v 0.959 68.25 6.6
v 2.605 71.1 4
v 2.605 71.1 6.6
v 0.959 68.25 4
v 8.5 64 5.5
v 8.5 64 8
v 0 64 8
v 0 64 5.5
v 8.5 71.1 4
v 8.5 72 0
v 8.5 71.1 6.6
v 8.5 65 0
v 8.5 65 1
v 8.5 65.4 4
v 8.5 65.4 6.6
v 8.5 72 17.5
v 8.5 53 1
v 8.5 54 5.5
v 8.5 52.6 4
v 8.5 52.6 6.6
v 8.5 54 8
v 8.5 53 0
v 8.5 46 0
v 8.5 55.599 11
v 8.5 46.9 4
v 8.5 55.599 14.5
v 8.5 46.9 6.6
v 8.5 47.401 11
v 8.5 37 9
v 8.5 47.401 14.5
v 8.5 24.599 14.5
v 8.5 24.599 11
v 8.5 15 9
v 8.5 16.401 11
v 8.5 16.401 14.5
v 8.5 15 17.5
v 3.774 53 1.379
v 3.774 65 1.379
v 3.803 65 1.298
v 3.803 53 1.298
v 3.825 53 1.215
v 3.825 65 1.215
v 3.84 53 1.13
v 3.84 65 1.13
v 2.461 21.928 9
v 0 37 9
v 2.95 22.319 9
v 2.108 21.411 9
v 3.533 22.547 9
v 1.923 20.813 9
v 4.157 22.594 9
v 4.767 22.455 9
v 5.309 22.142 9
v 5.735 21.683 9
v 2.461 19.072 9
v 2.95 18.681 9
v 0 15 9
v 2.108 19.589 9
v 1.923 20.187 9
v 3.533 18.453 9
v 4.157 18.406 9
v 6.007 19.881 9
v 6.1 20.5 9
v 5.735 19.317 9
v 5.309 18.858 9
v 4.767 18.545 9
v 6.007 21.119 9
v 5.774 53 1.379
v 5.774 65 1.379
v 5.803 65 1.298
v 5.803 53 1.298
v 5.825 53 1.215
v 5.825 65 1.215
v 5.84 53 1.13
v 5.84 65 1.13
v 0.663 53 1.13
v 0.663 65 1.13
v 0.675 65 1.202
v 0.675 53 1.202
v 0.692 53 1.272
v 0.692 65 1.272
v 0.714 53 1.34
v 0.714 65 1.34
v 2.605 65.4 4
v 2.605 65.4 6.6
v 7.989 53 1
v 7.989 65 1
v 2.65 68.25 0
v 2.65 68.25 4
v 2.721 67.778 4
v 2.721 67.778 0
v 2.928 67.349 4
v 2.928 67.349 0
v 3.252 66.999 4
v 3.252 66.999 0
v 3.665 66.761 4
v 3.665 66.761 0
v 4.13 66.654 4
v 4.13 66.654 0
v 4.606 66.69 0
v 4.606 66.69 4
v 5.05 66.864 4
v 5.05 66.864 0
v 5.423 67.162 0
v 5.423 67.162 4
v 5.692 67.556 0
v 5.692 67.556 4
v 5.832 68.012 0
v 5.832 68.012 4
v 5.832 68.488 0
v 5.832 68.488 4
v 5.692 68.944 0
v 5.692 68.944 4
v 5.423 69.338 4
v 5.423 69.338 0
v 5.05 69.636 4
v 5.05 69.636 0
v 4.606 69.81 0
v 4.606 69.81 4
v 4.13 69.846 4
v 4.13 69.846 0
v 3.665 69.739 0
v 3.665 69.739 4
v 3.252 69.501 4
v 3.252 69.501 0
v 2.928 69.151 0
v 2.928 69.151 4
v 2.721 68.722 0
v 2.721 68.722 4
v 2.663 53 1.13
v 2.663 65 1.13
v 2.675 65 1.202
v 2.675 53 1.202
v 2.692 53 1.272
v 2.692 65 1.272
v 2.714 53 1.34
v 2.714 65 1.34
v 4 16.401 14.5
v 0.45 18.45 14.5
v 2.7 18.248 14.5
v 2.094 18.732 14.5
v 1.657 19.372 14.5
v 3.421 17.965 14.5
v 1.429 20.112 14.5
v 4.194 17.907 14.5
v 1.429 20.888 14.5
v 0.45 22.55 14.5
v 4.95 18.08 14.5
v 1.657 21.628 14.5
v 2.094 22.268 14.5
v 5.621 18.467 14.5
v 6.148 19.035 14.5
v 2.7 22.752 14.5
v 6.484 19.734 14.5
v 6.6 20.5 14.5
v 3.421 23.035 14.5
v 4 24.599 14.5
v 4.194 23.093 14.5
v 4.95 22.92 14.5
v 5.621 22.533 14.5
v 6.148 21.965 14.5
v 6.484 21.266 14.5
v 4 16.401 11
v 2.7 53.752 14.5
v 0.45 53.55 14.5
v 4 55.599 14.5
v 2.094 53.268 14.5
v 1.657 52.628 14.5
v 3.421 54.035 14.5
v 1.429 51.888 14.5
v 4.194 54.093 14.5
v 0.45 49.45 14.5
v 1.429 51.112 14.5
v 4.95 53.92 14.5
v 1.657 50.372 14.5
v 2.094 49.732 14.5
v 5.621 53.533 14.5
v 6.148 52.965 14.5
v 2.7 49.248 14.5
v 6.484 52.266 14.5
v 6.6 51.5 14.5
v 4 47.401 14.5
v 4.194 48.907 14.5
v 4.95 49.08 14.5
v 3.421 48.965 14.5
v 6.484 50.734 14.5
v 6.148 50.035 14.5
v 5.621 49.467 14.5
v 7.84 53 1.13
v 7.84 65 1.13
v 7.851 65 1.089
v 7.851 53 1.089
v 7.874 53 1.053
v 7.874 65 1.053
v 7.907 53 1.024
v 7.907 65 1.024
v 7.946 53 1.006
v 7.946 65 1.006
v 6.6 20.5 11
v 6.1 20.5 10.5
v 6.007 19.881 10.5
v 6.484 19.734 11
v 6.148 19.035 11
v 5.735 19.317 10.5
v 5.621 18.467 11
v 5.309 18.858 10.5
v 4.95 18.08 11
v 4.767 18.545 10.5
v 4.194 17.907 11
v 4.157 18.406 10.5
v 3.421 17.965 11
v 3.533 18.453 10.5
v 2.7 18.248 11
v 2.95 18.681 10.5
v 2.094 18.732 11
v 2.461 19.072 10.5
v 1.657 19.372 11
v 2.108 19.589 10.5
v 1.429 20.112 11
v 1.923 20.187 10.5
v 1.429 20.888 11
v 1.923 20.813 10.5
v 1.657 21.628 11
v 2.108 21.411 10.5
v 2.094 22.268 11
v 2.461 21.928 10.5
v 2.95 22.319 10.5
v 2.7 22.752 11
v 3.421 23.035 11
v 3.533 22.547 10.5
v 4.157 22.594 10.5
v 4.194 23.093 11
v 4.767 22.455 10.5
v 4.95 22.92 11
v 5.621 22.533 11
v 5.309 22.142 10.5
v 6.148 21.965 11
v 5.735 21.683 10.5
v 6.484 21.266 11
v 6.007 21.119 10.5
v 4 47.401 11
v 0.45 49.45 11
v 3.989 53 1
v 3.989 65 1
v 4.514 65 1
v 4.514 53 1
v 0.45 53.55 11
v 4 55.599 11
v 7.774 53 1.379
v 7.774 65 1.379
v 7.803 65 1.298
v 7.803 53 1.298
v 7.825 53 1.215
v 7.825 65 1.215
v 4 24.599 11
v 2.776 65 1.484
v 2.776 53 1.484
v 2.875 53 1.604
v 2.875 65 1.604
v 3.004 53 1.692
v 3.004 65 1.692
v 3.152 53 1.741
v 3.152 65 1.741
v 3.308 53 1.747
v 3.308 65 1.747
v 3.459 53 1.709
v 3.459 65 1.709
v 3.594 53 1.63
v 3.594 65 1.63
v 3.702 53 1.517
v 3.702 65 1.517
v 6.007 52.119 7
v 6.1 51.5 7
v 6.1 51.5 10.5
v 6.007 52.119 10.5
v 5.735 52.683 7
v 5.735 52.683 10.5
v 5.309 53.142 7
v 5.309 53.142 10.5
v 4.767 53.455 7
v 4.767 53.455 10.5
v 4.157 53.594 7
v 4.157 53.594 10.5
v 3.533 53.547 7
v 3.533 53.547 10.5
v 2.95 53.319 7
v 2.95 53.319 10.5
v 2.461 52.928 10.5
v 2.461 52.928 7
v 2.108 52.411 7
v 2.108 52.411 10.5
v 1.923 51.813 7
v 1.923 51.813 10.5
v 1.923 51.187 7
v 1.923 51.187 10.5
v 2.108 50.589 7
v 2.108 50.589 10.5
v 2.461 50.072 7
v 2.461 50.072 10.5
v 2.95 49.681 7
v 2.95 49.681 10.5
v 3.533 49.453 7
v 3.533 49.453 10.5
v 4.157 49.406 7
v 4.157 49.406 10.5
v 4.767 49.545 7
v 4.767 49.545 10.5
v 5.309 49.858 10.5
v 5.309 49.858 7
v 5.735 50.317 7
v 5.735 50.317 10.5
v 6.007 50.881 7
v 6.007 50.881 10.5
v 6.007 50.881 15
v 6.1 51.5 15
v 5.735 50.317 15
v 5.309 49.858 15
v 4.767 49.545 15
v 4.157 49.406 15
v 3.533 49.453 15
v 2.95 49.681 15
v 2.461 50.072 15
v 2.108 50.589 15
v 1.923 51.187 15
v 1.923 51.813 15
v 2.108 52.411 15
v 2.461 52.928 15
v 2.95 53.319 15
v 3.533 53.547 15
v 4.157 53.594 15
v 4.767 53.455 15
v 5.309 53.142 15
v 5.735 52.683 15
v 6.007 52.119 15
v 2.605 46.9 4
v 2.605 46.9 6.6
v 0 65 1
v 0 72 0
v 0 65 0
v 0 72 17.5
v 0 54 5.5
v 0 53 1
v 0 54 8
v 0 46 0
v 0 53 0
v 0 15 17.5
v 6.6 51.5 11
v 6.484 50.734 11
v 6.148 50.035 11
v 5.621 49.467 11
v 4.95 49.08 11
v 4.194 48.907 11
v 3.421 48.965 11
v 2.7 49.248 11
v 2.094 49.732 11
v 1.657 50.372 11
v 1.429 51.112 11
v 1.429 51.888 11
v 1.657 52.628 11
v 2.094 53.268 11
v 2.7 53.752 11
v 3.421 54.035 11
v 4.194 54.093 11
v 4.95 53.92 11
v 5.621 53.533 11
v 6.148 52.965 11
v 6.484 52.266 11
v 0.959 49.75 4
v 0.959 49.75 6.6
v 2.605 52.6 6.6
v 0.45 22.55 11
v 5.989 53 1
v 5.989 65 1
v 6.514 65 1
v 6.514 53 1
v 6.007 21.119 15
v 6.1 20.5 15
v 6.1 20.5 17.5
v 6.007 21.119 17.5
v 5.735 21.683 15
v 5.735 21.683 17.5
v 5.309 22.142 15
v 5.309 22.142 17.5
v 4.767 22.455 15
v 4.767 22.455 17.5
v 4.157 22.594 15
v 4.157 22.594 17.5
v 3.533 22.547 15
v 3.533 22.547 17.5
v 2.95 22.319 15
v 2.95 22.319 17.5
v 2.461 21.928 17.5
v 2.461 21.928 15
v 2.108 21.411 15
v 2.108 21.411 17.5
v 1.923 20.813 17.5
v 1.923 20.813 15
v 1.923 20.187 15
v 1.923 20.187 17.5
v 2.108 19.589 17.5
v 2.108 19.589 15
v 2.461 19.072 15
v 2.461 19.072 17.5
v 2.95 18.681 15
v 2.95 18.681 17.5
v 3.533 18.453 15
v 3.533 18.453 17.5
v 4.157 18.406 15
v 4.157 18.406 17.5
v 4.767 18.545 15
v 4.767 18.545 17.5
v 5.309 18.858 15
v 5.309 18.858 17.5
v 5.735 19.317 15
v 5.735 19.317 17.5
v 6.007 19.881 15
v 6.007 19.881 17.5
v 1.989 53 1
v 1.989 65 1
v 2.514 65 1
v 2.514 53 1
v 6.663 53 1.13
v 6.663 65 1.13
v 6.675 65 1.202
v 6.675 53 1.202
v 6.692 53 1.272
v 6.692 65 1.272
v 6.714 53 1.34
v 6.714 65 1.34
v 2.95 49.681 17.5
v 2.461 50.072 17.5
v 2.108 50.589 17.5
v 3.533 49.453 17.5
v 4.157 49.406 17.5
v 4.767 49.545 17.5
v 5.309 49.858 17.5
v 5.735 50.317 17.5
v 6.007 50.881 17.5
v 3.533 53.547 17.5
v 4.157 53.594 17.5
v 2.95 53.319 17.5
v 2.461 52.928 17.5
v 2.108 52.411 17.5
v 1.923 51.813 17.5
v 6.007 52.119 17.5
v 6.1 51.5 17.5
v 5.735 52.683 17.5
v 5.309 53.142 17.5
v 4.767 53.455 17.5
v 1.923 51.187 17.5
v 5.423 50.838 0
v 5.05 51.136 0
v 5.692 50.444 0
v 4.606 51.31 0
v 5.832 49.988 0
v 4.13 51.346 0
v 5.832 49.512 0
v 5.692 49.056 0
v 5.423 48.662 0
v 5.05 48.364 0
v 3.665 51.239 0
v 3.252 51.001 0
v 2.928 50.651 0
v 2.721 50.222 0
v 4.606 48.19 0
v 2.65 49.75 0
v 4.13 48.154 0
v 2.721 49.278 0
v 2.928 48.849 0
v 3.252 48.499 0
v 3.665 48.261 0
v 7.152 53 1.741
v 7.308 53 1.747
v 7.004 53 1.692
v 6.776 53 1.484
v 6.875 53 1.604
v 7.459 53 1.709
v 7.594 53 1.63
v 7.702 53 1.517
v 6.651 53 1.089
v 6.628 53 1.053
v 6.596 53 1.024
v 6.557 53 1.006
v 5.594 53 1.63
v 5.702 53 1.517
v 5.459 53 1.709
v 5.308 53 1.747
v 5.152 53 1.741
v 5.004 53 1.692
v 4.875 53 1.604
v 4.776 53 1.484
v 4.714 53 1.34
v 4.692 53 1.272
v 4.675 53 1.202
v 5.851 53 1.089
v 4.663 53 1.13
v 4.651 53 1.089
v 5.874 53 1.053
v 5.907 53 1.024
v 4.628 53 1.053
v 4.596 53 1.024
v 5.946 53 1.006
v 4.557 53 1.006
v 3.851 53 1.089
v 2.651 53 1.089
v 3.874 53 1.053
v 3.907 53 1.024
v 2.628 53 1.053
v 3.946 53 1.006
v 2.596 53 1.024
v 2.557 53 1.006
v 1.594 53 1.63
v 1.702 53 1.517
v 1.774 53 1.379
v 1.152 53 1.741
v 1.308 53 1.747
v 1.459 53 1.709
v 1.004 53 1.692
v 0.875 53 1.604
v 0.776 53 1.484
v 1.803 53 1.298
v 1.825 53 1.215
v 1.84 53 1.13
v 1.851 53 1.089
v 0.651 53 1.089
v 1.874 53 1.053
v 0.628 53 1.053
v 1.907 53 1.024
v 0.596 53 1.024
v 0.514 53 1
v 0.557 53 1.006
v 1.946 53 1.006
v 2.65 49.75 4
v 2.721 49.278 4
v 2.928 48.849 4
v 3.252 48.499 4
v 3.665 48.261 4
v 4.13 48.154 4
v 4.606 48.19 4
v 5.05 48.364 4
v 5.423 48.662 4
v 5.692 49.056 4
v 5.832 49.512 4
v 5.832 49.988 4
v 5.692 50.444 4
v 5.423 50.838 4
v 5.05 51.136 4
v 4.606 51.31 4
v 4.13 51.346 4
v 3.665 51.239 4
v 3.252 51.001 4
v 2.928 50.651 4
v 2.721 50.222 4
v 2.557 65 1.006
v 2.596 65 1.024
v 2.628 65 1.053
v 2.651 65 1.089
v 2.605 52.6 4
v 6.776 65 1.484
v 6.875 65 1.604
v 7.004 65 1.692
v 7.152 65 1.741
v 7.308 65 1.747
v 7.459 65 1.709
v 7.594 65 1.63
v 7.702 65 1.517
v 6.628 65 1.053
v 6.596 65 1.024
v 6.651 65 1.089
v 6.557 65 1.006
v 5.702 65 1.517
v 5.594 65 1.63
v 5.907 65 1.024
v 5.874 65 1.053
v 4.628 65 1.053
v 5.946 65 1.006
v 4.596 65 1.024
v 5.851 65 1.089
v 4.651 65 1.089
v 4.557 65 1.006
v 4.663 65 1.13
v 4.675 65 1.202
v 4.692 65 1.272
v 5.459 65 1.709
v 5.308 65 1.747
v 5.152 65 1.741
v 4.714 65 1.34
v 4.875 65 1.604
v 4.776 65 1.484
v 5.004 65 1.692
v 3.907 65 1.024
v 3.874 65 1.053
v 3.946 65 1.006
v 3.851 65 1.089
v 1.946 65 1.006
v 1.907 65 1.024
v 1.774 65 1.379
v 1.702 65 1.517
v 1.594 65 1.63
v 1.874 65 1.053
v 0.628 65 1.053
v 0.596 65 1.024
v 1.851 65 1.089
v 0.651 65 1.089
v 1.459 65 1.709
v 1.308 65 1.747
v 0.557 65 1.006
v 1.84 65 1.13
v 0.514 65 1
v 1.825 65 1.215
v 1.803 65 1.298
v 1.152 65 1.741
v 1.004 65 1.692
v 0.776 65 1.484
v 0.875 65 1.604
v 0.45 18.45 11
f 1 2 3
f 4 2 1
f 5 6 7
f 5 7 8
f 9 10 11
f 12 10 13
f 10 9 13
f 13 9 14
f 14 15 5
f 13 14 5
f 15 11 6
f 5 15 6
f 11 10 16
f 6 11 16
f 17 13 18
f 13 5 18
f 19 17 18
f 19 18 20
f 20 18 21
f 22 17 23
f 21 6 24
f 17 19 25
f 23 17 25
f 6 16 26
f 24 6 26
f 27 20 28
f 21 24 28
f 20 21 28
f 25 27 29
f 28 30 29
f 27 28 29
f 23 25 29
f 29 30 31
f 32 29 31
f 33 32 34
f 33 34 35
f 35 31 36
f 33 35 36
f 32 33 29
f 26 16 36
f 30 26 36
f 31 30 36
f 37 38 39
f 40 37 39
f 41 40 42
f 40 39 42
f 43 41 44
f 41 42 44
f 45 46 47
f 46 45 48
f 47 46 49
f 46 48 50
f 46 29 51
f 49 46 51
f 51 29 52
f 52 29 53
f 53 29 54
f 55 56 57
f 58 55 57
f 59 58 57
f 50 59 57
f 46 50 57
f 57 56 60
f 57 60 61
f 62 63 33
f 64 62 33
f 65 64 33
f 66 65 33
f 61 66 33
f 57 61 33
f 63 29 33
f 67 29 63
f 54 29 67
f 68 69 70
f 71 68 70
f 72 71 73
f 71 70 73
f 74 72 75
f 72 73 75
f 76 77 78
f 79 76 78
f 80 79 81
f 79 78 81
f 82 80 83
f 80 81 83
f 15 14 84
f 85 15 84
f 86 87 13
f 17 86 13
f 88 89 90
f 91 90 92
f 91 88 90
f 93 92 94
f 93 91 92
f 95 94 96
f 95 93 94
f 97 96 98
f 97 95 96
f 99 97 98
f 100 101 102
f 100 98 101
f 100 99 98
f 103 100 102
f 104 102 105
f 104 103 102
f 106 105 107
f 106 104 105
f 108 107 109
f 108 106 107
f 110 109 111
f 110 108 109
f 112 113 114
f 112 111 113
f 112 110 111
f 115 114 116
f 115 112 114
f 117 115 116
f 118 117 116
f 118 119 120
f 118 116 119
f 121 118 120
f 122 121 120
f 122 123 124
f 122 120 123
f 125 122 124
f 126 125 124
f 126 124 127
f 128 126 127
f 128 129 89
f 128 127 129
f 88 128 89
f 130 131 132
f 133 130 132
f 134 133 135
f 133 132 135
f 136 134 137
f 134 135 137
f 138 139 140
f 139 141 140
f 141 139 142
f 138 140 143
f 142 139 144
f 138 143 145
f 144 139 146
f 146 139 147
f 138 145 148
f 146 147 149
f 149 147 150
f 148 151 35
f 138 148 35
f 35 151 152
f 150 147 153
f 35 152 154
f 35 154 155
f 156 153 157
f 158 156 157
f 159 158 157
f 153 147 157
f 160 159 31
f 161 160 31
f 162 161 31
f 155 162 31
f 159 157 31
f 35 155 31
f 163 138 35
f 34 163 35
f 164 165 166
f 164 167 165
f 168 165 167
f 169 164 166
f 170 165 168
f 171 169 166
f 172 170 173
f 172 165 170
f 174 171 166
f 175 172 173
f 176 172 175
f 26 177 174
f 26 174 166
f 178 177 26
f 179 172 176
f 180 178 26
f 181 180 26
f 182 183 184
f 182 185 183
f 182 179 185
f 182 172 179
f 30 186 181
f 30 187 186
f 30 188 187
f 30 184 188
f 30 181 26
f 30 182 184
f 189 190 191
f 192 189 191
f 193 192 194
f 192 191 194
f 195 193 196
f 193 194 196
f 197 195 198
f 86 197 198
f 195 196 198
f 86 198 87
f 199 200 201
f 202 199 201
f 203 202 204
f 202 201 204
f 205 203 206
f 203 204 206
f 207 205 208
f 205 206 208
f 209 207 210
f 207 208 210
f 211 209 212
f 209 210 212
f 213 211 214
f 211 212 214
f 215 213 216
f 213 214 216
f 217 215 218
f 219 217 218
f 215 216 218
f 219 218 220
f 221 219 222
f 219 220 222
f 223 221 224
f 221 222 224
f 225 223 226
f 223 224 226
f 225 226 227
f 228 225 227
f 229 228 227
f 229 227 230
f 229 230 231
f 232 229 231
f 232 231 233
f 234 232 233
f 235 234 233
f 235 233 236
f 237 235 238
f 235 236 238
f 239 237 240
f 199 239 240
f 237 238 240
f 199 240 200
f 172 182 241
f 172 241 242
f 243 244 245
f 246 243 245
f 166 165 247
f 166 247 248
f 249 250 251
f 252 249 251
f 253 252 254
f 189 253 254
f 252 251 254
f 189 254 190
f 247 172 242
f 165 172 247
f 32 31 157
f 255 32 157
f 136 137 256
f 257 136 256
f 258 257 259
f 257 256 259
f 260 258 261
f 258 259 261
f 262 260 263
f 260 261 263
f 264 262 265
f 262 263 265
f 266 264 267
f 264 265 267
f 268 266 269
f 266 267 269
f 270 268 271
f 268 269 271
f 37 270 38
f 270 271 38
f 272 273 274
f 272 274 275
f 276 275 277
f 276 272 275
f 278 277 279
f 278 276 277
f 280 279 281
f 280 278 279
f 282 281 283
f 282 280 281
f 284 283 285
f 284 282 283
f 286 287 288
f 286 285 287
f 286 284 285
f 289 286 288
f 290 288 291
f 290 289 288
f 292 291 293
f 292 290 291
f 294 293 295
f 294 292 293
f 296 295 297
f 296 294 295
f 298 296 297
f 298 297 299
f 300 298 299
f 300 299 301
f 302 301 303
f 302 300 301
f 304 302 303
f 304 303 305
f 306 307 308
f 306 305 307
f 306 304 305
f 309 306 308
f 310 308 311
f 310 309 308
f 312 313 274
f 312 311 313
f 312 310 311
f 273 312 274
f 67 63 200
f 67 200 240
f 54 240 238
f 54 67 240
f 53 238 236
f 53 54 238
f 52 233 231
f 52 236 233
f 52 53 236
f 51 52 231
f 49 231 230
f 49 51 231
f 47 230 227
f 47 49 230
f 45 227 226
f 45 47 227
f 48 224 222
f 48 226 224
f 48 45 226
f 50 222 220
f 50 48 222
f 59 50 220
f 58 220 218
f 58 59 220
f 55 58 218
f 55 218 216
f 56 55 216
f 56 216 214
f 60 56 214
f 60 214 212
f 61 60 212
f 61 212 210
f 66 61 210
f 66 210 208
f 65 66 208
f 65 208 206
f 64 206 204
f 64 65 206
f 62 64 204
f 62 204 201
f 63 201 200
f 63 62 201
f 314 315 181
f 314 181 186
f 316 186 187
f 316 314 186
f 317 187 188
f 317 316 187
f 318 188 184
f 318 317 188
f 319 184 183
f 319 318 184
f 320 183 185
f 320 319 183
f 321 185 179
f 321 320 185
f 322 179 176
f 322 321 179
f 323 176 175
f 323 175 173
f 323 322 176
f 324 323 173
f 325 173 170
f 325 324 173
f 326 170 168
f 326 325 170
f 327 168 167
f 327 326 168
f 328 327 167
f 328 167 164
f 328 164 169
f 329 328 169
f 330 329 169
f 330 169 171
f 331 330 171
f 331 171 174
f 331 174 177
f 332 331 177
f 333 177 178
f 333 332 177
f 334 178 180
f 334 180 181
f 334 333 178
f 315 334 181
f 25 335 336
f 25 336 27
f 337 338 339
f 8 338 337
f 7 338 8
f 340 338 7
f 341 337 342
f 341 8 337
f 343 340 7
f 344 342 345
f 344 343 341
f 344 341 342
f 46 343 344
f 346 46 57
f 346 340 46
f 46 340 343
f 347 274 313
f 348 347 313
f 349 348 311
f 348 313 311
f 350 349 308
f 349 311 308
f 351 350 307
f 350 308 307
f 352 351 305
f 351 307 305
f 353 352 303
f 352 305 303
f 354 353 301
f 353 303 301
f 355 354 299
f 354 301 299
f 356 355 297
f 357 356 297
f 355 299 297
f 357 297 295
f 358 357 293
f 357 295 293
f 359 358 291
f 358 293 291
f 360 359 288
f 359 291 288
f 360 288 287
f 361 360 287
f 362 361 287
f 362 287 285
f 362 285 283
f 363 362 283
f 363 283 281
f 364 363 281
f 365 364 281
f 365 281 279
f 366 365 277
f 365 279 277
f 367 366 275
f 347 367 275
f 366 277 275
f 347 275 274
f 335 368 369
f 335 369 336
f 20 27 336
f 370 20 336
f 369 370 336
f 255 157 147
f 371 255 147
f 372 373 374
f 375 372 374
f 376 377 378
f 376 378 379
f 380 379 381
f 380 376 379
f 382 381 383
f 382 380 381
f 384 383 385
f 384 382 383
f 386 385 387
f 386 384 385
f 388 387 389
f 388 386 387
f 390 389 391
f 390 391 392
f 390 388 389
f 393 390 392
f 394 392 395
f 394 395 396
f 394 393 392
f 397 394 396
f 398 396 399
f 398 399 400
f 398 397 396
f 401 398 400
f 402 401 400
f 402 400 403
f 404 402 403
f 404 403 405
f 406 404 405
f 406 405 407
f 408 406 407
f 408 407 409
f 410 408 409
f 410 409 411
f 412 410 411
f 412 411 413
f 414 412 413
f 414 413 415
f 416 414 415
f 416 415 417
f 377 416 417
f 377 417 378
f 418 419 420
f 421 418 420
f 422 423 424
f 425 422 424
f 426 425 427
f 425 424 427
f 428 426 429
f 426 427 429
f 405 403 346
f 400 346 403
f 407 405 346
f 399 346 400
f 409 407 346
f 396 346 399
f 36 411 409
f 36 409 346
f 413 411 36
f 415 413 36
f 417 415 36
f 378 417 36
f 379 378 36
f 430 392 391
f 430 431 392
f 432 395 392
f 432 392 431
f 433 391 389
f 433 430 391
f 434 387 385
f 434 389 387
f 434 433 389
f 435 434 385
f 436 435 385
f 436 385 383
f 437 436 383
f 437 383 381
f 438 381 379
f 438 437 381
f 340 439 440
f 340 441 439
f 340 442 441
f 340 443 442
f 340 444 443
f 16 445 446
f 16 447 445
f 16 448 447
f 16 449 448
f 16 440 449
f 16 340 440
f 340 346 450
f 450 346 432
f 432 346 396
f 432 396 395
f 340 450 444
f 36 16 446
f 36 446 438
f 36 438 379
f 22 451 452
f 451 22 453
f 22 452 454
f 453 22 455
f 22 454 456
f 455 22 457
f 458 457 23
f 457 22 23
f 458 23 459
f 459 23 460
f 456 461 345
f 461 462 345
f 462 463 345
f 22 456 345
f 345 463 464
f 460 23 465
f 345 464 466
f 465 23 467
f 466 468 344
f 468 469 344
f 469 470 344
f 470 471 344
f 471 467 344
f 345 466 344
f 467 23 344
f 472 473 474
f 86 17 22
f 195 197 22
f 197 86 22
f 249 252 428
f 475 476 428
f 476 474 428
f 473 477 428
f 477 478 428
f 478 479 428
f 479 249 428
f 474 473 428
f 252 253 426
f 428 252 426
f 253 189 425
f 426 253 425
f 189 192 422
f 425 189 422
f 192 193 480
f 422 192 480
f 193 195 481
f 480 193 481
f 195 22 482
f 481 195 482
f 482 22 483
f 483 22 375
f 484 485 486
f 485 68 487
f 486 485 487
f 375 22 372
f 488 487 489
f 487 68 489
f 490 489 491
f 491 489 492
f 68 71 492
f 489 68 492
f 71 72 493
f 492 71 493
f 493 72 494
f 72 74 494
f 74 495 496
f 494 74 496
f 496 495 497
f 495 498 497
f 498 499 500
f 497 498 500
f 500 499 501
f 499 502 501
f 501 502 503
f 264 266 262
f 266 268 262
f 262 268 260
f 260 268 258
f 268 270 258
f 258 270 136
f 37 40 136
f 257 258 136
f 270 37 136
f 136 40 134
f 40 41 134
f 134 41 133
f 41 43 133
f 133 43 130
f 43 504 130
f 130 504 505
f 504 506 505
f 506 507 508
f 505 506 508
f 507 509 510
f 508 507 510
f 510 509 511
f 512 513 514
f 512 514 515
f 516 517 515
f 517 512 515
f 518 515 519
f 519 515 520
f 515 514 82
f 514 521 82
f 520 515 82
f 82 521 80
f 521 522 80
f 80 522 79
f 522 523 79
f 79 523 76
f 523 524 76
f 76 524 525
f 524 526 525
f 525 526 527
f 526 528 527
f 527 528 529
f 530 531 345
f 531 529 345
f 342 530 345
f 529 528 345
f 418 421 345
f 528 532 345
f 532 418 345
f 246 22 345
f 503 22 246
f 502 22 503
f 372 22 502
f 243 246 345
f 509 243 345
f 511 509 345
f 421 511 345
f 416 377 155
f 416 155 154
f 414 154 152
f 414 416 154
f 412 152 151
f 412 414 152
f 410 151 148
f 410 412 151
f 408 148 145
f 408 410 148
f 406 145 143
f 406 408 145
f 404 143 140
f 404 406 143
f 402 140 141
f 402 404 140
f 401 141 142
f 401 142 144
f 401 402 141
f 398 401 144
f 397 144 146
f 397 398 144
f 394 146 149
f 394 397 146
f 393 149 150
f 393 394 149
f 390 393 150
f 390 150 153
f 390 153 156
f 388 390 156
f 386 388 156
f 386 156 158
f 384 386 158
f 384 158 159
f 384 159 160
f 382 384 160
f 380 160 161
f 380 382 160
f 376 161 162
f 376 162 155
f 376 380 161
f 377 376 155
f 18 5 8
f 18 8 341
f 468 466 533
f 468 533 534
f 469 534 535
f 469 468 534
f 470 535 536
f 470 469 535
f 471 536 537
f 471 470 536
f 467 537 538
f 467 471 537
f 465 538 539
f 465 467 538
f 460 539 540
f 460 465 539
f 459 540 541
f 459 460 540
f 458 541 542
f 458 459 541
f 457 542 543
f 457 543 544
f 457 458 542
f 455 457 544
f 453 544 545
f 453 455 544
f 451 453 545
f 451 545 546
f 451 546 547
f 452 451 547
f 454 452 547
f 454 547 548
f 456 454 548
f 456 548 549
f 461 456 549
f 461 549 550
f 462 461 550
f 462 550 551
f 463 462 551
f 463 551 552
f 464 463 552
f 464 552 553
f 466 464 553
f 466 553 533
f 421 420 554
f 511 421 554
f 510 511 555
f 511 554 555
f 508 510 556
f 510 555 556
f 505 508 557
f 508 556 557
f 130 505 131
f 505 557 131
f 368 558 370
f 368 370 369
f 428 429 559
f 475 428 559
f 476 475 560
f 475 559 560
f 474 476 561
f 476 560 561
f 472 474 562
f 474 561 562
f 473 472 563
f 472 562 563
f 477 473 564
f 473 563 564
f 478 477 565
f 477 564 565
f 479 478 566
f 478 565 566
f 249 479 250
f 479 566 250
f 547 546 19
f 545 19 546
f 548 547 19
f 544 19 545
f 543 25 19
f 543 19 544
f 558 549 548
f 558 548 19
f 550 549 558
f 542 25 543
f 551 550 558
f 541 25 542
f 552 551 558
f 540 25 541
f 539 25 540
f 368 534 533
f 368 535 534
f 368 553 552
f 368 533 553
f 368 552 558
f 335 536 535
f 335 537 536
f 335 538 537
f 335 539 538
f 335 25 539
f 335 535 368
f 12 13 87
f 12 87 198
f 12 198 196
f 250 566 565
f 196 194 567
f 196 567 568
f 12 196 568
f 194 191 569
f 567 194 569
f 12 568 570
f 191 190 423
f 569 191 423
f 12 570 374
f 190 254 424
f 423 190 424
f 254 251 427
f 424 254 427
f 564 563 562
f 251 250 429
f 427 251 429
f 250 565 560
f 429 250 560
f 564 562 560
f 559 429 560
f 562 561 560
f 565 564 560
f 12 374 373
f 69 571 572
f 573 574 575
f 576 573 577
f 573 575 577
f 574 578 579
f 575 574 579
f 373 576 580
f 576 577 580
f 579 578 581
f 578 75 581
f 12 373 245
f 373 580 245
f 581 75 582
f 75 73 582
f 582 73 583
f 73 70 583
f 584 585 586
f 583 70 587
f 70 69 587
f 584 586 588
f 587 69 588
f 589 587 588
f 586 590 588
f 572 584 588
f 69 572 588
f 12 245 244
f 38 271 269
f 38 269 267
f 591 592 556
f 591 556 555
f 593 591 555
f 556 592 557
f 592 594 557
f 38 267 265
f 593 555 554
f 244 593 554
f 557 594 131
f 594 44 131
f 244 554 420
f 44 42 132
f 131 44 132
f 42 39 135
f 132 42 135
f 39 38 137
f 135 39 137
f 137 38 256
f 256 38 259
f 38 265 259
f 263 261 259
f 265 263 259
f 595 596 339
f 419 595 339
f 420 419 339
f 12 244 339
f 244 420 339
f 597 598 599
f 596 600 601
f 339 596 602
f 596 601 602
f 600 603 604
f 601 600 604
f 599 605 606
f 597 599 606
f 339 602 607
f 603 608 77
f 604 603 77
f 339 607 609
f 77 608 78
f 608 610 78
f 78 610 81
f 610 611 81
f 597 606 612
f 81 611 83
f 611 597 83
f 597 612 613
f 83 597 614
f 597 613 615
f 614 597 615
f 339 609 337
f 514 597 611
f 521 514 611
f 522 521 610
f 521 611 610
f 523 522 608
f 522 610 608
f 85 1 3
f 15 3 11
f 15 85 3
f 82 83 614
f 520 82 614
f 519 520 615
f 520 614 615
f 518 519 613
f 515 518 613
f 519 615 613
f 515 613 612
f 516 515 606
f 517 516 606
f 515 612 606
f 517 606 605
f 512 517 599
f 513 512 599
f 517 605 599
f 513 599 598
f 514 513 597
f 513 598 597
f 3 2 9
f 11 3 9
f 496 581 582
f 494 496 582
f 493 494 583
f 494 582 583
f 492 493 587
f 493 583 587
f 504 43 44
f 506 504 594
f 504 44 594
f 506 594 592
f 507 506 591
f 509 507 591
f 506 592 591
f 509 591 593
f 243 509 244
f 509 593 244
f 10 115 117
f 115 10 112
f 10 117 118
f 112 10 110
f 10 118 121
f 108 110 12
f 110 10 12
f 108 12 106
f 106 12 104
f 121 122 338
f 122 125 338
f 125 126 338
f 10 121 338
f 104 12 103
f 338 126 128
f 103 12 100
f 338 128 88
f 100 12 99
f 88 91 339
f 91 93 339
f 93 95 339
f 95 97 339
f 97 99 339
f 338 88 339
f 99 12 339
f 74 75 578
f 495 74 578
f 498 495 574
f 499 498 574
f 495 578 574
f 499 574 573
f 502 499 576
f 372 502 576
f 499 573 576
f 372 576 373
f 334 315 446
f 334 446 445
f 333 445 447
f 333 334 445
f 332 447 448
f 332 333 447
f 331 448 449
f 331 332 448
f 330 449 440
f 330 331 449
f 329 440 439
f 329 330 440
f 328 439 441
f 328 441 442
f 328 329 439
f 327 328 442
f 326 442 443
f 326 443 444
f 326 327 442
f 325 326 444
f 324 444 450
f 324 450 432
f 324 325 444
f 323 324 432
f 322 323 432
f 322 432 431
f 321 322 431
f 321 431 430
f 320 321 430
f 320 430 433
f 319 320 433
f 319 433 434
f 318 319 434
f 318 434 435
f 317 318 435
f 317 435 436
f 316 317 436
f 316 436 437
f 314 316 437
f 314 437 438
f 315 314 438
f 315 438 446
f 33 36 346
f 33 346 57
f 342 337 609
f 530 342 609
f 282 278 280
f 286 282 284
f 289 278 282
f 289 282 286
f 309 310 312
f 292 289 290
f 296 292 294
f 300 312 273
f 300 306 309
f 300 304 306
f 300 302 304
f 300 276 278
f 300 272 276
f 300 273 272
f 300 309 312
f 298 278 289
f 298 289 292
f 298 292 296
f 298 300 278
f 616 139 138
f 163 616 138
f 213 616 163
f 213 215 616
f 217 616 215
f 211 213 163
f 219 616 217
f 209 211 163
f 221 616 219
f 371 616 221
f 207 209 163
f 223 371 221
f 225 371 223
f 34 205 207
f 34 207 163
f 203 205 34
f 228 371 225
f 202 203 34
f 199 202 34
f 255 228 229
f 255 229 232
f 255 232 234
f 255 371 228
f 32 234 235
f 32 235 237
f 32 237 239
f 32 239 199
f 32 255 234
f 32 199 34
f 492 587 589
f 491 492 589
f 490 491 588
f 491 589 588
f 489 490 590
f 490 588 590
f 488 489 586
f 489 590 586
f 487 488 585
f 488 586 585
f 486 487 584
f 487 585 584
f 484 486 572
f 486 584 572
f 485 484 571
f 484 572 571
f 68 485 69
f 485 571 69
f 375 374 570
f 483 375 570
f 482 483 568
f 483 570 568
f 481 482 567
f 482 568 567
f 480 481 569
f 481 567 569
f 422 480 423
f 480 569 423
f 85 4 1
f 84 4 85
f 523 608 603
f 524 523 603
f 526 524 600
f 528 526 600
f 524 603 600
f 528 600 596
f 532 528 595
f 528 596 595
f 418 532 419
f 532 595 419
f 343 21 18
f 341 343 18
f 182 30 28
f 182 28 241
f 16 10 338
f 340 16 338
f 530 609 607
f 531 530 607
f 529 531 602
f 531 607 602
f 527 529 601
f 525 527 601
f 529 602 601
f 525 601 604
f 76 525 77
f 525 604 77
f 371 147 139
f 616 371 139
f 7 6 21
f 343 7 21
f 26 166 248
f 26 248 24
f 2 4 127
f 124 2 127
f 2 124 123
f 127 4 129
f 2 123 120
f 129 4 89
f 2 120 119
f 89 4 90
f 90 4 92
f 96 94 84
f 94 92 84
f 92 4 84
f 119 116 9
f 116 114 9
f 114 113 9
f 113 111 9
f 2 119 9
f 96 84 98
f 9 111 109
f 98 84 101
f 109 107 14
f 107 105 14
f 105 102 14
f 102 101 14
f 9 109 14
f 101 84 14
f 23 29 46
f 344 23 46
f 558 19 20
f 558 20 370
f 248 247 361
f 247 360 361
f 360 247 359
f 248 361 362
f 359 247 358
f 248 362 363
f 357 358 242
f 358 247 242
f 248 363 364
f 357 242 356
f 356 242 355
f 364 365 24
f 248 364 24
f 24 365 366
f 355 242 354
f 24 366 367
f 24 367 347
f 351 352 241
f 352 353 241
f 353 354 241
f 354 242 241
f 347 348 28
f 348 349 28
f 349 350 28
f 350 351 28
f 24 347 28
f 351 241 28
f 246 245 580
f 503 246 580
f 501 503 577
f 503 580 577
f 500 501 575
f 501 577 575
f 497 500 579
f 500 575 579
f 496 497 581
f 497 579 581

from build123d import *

# Parameters (mm, degrees)
ESQUISSE1_W              = 8.5
ESQUISSE1_H              = 72
ESQUISSE1_R              = 2.1
BOSS_EXTRU_1_DEPTH       = 17.5
ENL_V_START              = -3
ENL_V_MAT_EXTRU_4_DEPTH  = 3.5
ESQUISSE7_R              = 2.1
BOSS_EXTRU_3_DEPTH       = 7
ESQUISSE3_W              = 8.5
ESQUISSE3_H              = 4
ENL_V_MAT_EXTRU_3_DEPTH  = 19
BOSS_EXTRU_2_START       = -7
BOSS_EXTRU_2_DEPTH       = 12
ESQUISSE8_W              = 8.5
ESQUISSE8_H              = 7
BOSS_EXTRU_4_DEPTH       = 4
ESQUISSE9_R              = 1.6
ENL_V_MAT_EXTRU_5_DEPTH  = 5
ENL_V_START_2            = -4
ESQUISSE10_R             = 1.6
ENL_V_MAT_EXTRU_6_DEPTH  = 2.6
ESQUISSE11_R             = 1.6
ENL_V_MAT_EXTRU_7_DEPTH  = 1.6
ESQUISSE14_W             = 2.5
ESQUISSE14_H             = 10
ENL_V_MAT_EXTRU_9_DEPTH  = 17.6
CHANFREIN1_SIZE          = 0.5
ESQUISSE15_W             = 8.5
ESQUISSE15_H             = 15
ESQUISSE15_W_2           = 2.6
ESQUISSE15_H_2           = 5.7
ESQUISSE15_W_3           = 2.5
ESQUISSE15_H_3           = 10
ENL_V_MAT_EXTRU_10_DEPTH = 10
CHANFREIN2_SIZE          = 9


with BuildPart() as part:
    # Esquisse1 → Boss.-Extru.1 (new body)
    with BuildSketch(Plane.XY):
        with Locations((4.25, 36)):
            Rectangle(ESQUISSE1_W, ESQUISSE1_H)
        with Locations((4, 20.5)):
            Circle(ESQUISSE1_R, mode=Mode.SUBTRACT)
        with Locations((4, 51.5)):
            Circle(ESQUISSE1_R, mode=Mode.SUBTRACT)
    extrude(amount=BOSS_EXTRU_1_DEPTH)

    # Esquisse6 → Enlèv. mat.-Extru.4 (cut)
    with BuildSketch(Plane.XY.offset(17.5).offset(ENL_V_START)):
        Polygon((7.55, 22.549593456), (4, 24.599186911), (0.45, 22.549593456), (0.45, 18.450406544), (4, 16.400813089), (7.55, 18.450406544), align=None)
        Polygon((8.5, 24.599186911), (4, 24.599186911), (7.55, 22.549593456), (7.55, 18.450406544), (4, 16.400813089), (8.5, 16.400813089), align=None)
    enl_v_mat_extru_4 = extrude(amount=-ENL_V_MAT_EXTRU_4_DEPTH, mode=Mode.SUBTRACT)

    # Esquisse7 → Boss.-Extru.3 (add)
    with BuildSketch(Plane(origin=(0, 0, 0), x_dir=(-1, 0, 0), z_dir=(0, 0, -1))):
        with Locations((-4, 20.5)):
            Circle(ESQUISSE7_R)
    boss_extru_3 = extrude(amount=-BOSS_EXTRU_3_DEPTH)

    # Esquisse3 → Enlèv. mat.-Extru.3 (cut)
    with BuildSketch(Plane(origin=(0, 0, 0), x_dir=(-1, 0, 0), z_dir=(0, -1, 0))):
        with Locations((-4.25, -2)):
            Rectangle(ESQUISSE3_W, ESQUISSE3_H)
    enl_v_mat_extru_3 = extrude(amount=-ENL_V_MAT_EXTRU_3_DEPTH, mode=Mode.SUBTRACT)

    # Esquisse5 → Boss.-Extru.2 (add)
    with BuildSketch(Plane.XZ.offset(BOSS_EXTRU_2_START)):
        with BuildLine():
            ThreePointArc((4.662966644, 1.130359715), (4.682946936, 1.236721088), (4.714353535, 1.340285461))
            ThreePointArc((4.714353535, 1.340285461), (5.229781903, 1.749631615), (5.773646598, 1.378900082))
            ThreePointArc((5.773646598, 1.378900082), (5.814751932, 1.256791784), (5.839789089, 1.130406557))
            ThreePointArc((5.839789089, 1.130406557), (5.889607538, 1.037219203), (5.988503907, 1))
            Line((5.988503907, 1), (6.514258005, 1))
            ThreePointArc((6.514258005, 1), (6.613136611, 1.037203629), (6.662966644, 1.130359715))
            ThreePointArc((6.662966644, 1.130359715), (6.682946936, 1.236721088), (6.714353535, 1.340285461))
            ThreePointArc((6.714353535, 1.340285461), (7.229781903, 1.749631615), (7.773646598, 1.378900082))
            ThreePointArc((7.773646598, 1.378900082), (7.814751933, 1.256791779), (7.83978909, 1.130406547))
            ThreePointArc((7.83978909, 1.130406547), (7.889607542, 1.037219199), (7.988503907, 1))
            Line((7.988503907, 1), (8.5, 1))
            Line((8.5, 1), (8.5, 4))
            Line((8.5, 4), (0, 4))
            Line((0, 4), (0, 1))
            Line((0, 1), (0.514258005, 1))
            ThreePointArc((0.514258005, 1), (0.613136611, 1.037203629), (0.662966644, 1.130359715))
            ThreePointArc((0.662966644, 1.130359715), (0.682946936, 1.236721088), (0.714353535, 1.340285461))
            ThreePointArc((0.714353535, 1.340285461), (1.229781903, 1.749631615), (1.773646598, 1.378900082))
            ThreePointArc((1.773646598, 1.378900082), (1.814751933, 1.256791781), (1.83978909, 1.130406551))
            ThreePointArc((1.83978909, 1.130406551), (1.88960754, 1.037219201), (1.988503907, 1))
            Line((1.988503907, 1), (2.514258005, 1))
            ThreePointArc((2.514258005, 1), (2.613136611, 1.037203629), (2.662966644, 1.130359715))
            ThreePointArc((2.662966644, 1.130359715), (2.682946936, 1.236721088), (2.714353535, 1.340285461))
            ThreePointArc((2.714353535, 1.340285461), (3.229781903, 1.749631615), (3.773646598, 1.378900082))
            ThreePointArc((3.773646598, 1.378900082), (3.814751933, 1.256791781), (3.83978909, 1.130406551))
            ThreePointArc((3.83978909, 1.130406551), (3.88960754, 1.037219201), (3.988503907, 1))
            Line((3.988503907, 1), (4.514258005, 1))
            ThreePointArc((4.514258005, 1), (4.613136611, 1.037203629), (4.662966644, 1.130359715))
        make_face()
    boss_extru_2 = extrude(amount=-BOSS_EXTRU_2_DEPTH)

    # Esquisse8 → Boss.-Extru.4 (add)
    with BuildSketch(Plane(origin=(0, 0, 4), x_dir=(-1, 0, 0), z_dir=(0, 0, -1))):
        with Locations((-4.25, 3.5)):
            Rectangle(ESQUISSE8_W, ESQUISSE8_H)
    boss_extru_4 = extrude(amount=BOSS_EXTRU_4_DEPTH)

    # Esquisse9 → Enlèv. mat.-Extru.5 (cut)
    with BuildSketch(Plane(origin=(0, 0, 0), x_dir=(-1, 0, 0), z_dir=(0, 0, -1))):
        with Locations((-4.25, 3.75)):
            Circle(ESQUISSE9_R)
        with Locations((-4.25, 22.25)):
            Circle(ESQUISSE9_R)
    enl_v_mat_extru_5 = extrude(amount=-ENL_V_MAT_EXTRU_5_DEPTH, mode=Mode.SUBTRACT)

    # Esquisse10 → Enlèv. mat.-Extru.6 (cut)
    # profile 1 of 4: a face of its own
    with BuildSketch(Plane(origin=(0, 0, 0), x_dir=(-1, 0, 0), z_dir=(0, 0, -1)).offset(ENL_V_START_2)):
        Polygon((-2.604551733, 25.1), (-5.895448267, 25.1), (-7.540896534, 22.25), (-5.895448267, 19.4), (-2.604551733, 19.4), (-0.959103466, 22.25), align=None)
        with Locations((-4.25, 22.25)):
            Circle(ESQUISSE10_R, mode=Mode.SUBTRACT)
    # profile 2 of 4: a face of its own
    with BuildSketch(Plane(origin=(0, 0, 0), x_dir=(-1, 0, 0), z_dir=(0, 0, -1)).offset(ENL_V_START_2)):
        Polygon((-2.604551733, 6.6), (-5.895448267, 6.6), (-7.540896534, 3.75), (-5.895448267, 0.9), (-2.604551733, 0.9), (-0.959103466, 3.75), align=None)
    # profile 3 of 4: a face of its own
    with BuildSketch(Plane(origin=(0, 0, 0), x_dir=(-1, 0, 0), z_dir=(0, 0, -1)).offset(ENL_V_START_2)):
        Polygon((-8.5, 6.6), (-5.895448267, 6.6), (-7.540896534, 3.75), (-5.895448267, 0.9), (-8.5, 0.9), align=None)
    # profile 4 of 4: a face of its own
    with BuildSketch(Plane(origin=(0, 0, 0), x_dir=(-1, 0, 0), z_dir=(0, 0, -1)).offset(ENL_V_START_2)):
        Polygon((-7.540896534, 22.25), (-5.895448267, 25.1), (-8.5, 25.1), (-8.5, 19.4), (-5.895448267, 19.4), align=None)
    enl_v_mat_extru_6 = extrude(amount=-ENL_V_MAT_EXTRU_6_DEPTH, mode=Mode.SUBTRACT)

    # Esquisse11 → Enlèv. mat.-Extru.7 (cut)
    with BuildSketch(Plane(origin=(0, 0, 5), x_dir=(-1, 0, 0), z_dir=(0, 0, -1))):
        with Locations((-4.25, 22.25)):
            Circle(ESQUISSE11_R)
    enl_v_mat_extru_7 = extrude(amount=-ENL_V_MAT_EXTRU_7_DEPTH, mode=Mode.SUBTRACT)

    # Esquisse14 → Enlèv. mat.-Extru.9 (cut)
    with BuildSketch(Plane(origin=(8.5, 0, 0), x_dir=(0, 0, -1), z_dir=(1, 0, 0))):
        with Locations((-6.75, 13)):
            Rectangle(ESQUISSE14_W, ESQUISSE14_H)
    enl_v_mat_extru_9 = extrude(amount=-ENL_V_MAT_EXTRU_9_DEPTH, mode=Mode.SUBTRACT)

    # Symétrie14: Enlèv. mat.-Extru.4, Boss.-Extru.3, Enlèv. mat.-Extru.3, Boss.-Extru.2, Boss.-Extru.4, Enlèv. mat.-Extru.5, Enlèv. mat.-Extru.6, Enlèv. mat.-Extru.7, Enlèv. mat.-Extru.9 across plane
    add(enl_v_mat_extru_4.mirror(Plane(origin=(0, 36, 0), x_dir=(0, 0, 1), z_dir=(0, -1, 0))), mode=Mode.SUBTRACT)
    add(boss_extru_3.mirror(Plane(origin=(0, 36, 0), x_dir=(0, 0, 1), z_dir=(0, -1, 0))))
    add(enl_v_mat_extru_3.mirror(Plane(origin=(0, 36, 0), x_dir=(0, 0, 1), z_dir=(0, -1, 0))), mode=Mode.SUBTRACT)
    add(boss_extru_2.mirror(Plane(origin=(0, 36, 0), x_dir=(0, 0, 1), z_dir=(0, -1, 0))))
    add(boss_extru_4.mirror(Plane(origin=(0, 36, 0), x_dir=(0, 0, 1), z_dir=(0, -1, 0))))
    add(enl_v_mat_extru_5.mirror(Plane(origin=(0, 36, 0), x_dir=(0, 0, 1), z_dir=(0, -1, 0))), mode=Mode.SUBTRACT)
    add(enl_v_mat_extru_6.mirror(Plane(origin=(0, 36, 0), x_dir=(0, 0, 1), z_dir=(0, -1, 0))), mode=Mode.SUBTRACT)
    add(enl_v_mat_extru_7.mirror(Plane(origin=(0, 36, 0), x_dir=(0, 0, 1), z_dir=(0, -1, 0))), mode=Mode.SUBTRACT)
    add(enl_v_mat_extru_9.mirror(Plane(origin=(0, 36, 0), x_dir=(0, 0, 1), z_dir=(0, -1, 0))), mode=Mode.SUBTRACT)

    # Chanfrein1
    chanfrein1_edges = [part.edges().sort_by_distance(p)[0] for p in [
        (1.9, 51.5, 14.5),
        (1.9, 51.5, 11),
        (1.9, 20.5, 11),
        (1.9, 20.5, 14.5),
    ]]
    chamfer(chanfrein1_edges, length=CHANFREIN1_SIZE)

    # Esquisse15 → Enlèv. mat.-Extru.10 (cut)
    # profile 1 of 2: a face of its own
    with BuildSketch(Plane(origin=(8.5, 0, 0), x_dir=(0, 0, -1), z_dir=(1, 0, 0))):
        with Locations((-13.25, 7.5)):
            Rectangle(ESQUISSE15_W, ESQUISSE15_H)
    # profile 2 of 2: a face of its own
    with BuildSketch(Plane(origin=(8.5, 0, 0), x_dir=(0, 0, -1), z_dir=(1, 0, 0))):
        Polygon((-9, 0), (0, 0), (0, 7), (-1, 7), (-1, 19), (0, 19), (0, 46), (-9, 46), (-9, 15), align=None)
        with Locations((-5.3, 3.75)):
            Rectangle(ESQUISSE15_W_2, ESQUISSE15_H_2, mode=Mode.SUBTRACT)
        with Locations((-6.75, 13)):
            Rectangle(ESQUISSE15_W_3, ESQUISSE15_H_3, mode=Mode.SUBTRACT)
        with Locations((-5.3, 22.25)):
            Rectangle(ESQUISSE15_W_2, ESQUISSE15_H_2, mode=Mode.SUBTRACT)
    extrude(amount=-ENL_V_MAT_EXTRU_10_DEPTH, mode=Mode.SUBTRACT)


with BuildPart() as enl_v_mat_extru_10_kept_piece:
    # of the separate pieces the step leaves, the one the design keeps (enl_v_mat_extru_10_pieces_kept)
    add(part.part.solids().sort_by_distance((6.6, 20.5, 14.5))[0])

    # Chanfrein2
    chanfrein2_edges = [enl_v_mat_extru_10_kept_piece.edges().sort_by_distance(p)[0] for p in [
        (4.25, 46, 9),
    ]]
    chamfer(chanfrein2_edges, length=CHANFREIN2_SIZE - 0.0001)  # a hair under: the kernel refuses the full size


solid = enl_v_mat_extru_10_kept_piece.part
